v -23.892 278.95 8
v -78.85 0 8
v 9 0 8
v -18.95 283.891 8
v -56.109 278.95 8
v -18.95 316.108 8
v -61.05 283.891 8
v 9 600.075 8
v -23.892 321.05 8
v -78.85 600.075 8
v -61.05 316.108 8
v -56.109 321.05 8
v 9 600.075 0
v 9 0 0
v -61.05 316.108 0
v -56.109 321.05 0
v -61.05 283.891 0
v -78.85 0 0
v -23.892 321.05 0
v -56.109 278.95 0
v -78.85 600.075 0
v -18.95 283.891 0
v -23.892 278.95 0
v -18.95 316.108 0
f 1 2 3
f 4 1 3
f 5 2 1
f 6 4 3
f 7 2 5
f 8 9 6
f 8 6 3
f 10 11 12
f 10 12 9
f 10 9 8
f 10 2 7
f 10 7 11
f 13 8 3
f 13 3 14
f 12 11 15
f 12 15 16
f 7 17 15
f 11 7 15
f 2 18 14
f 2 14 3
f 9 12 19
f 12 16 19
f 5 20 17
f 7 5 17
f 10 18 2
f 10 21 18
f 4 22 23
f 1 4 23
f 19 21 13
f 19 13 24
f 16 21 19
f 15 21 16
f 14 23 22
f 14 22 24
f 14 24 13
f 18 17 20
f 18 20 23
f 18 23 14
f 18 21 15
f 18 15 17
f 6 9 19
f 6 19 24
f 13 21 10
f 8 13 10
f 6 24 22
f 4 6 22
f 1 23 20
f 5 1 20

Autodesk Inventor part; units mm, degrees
ref_plane "YZ Plane" through (0, 0, 0) normal (1, 0, 0) x (0, 1, 0)
ref_plane "XZ Plane" through (0, 0, 0) normal (0, 1, 0) x (-1, 0, 0)
ref_plane "XY Plane" through (0, 0, 0) normal (0, 0, 1) x (1, 0, 0)
sketch "Sketch1" plane through (0, 0, 0) normal (0, 0, 1) x (1, 0, 0)
  line L0 (0, 0) -> (-69.8501, 0)
  line L1 (-69.8501, 0) -> (-69.8501, 600.075)
  line L2 (-69.8501, 600.075) -> (0, 600.075)
  line L3 (0, 600.075) -> (0, 0)
  line L4 (-56.1086, 321.0499) -> (-23.8915, 321.0499) projected
  line L5 (-23.8915, 321.0499) -> (-18.9501, 316.1085) projected
  line L6 (-18.9501, 316.1085) -> (-18.9501, 283.8914) projected
  line L7 (-61.0501, 316.1085) -> (-56.1086, 321.0499) projected
  line L8 (-61.0501, 283.8914) -> (-61.0501, 316.1085) projected
  line L9 (-56.1086, 278.9499) -> (-61.0501, 283.8914) projected
  line L10 (-23.8915, 278.9499) -> (-56.1086, 278.9499) projected
  line L11 (-18.9501, 283.8914) -> (-23.8915, 278.9499) projected
  dimension "d2" = 8.8
  dimension "d3" = 18.9501
extrude "Extrusion1" add sketch "Sketch1" along normal blind 8
sketch "Sketch2" plane through (-69.8501, 0, 0) normal (-1, 0, 0) x (0, 0, 1)
  line L0 (0, 0) -> (0, 600.075) projected
  line L1 (0, 0) -> (8, 0) projected
  line L2 (8, 600.075) -> (8, 0) projected
  line L3 (0, 600.075) -> (8, 600.075) projected
  point P0 (0, 0)
extrude "Extrusion2" add sketch "Sketch2" along normal blind 9
sketch "Sketch3" plane through (0, 0, 0) normal (1, 0, 0) x (0, 0, -1)
  line L0 (0, 600.075) -> (0, 0) projected
  line L1 (0, 600.075) -> (-8, 600.075) projected
  line L2 (-8, 0) -> (-8, 600.075) projected
  line L3 (0, 0) -> (-8, 0) projected
extrude "Extrusion3" add sketch "Sketch3" along normal blind 9
properties part number "placa spate" material "Wood (Cherry)"
